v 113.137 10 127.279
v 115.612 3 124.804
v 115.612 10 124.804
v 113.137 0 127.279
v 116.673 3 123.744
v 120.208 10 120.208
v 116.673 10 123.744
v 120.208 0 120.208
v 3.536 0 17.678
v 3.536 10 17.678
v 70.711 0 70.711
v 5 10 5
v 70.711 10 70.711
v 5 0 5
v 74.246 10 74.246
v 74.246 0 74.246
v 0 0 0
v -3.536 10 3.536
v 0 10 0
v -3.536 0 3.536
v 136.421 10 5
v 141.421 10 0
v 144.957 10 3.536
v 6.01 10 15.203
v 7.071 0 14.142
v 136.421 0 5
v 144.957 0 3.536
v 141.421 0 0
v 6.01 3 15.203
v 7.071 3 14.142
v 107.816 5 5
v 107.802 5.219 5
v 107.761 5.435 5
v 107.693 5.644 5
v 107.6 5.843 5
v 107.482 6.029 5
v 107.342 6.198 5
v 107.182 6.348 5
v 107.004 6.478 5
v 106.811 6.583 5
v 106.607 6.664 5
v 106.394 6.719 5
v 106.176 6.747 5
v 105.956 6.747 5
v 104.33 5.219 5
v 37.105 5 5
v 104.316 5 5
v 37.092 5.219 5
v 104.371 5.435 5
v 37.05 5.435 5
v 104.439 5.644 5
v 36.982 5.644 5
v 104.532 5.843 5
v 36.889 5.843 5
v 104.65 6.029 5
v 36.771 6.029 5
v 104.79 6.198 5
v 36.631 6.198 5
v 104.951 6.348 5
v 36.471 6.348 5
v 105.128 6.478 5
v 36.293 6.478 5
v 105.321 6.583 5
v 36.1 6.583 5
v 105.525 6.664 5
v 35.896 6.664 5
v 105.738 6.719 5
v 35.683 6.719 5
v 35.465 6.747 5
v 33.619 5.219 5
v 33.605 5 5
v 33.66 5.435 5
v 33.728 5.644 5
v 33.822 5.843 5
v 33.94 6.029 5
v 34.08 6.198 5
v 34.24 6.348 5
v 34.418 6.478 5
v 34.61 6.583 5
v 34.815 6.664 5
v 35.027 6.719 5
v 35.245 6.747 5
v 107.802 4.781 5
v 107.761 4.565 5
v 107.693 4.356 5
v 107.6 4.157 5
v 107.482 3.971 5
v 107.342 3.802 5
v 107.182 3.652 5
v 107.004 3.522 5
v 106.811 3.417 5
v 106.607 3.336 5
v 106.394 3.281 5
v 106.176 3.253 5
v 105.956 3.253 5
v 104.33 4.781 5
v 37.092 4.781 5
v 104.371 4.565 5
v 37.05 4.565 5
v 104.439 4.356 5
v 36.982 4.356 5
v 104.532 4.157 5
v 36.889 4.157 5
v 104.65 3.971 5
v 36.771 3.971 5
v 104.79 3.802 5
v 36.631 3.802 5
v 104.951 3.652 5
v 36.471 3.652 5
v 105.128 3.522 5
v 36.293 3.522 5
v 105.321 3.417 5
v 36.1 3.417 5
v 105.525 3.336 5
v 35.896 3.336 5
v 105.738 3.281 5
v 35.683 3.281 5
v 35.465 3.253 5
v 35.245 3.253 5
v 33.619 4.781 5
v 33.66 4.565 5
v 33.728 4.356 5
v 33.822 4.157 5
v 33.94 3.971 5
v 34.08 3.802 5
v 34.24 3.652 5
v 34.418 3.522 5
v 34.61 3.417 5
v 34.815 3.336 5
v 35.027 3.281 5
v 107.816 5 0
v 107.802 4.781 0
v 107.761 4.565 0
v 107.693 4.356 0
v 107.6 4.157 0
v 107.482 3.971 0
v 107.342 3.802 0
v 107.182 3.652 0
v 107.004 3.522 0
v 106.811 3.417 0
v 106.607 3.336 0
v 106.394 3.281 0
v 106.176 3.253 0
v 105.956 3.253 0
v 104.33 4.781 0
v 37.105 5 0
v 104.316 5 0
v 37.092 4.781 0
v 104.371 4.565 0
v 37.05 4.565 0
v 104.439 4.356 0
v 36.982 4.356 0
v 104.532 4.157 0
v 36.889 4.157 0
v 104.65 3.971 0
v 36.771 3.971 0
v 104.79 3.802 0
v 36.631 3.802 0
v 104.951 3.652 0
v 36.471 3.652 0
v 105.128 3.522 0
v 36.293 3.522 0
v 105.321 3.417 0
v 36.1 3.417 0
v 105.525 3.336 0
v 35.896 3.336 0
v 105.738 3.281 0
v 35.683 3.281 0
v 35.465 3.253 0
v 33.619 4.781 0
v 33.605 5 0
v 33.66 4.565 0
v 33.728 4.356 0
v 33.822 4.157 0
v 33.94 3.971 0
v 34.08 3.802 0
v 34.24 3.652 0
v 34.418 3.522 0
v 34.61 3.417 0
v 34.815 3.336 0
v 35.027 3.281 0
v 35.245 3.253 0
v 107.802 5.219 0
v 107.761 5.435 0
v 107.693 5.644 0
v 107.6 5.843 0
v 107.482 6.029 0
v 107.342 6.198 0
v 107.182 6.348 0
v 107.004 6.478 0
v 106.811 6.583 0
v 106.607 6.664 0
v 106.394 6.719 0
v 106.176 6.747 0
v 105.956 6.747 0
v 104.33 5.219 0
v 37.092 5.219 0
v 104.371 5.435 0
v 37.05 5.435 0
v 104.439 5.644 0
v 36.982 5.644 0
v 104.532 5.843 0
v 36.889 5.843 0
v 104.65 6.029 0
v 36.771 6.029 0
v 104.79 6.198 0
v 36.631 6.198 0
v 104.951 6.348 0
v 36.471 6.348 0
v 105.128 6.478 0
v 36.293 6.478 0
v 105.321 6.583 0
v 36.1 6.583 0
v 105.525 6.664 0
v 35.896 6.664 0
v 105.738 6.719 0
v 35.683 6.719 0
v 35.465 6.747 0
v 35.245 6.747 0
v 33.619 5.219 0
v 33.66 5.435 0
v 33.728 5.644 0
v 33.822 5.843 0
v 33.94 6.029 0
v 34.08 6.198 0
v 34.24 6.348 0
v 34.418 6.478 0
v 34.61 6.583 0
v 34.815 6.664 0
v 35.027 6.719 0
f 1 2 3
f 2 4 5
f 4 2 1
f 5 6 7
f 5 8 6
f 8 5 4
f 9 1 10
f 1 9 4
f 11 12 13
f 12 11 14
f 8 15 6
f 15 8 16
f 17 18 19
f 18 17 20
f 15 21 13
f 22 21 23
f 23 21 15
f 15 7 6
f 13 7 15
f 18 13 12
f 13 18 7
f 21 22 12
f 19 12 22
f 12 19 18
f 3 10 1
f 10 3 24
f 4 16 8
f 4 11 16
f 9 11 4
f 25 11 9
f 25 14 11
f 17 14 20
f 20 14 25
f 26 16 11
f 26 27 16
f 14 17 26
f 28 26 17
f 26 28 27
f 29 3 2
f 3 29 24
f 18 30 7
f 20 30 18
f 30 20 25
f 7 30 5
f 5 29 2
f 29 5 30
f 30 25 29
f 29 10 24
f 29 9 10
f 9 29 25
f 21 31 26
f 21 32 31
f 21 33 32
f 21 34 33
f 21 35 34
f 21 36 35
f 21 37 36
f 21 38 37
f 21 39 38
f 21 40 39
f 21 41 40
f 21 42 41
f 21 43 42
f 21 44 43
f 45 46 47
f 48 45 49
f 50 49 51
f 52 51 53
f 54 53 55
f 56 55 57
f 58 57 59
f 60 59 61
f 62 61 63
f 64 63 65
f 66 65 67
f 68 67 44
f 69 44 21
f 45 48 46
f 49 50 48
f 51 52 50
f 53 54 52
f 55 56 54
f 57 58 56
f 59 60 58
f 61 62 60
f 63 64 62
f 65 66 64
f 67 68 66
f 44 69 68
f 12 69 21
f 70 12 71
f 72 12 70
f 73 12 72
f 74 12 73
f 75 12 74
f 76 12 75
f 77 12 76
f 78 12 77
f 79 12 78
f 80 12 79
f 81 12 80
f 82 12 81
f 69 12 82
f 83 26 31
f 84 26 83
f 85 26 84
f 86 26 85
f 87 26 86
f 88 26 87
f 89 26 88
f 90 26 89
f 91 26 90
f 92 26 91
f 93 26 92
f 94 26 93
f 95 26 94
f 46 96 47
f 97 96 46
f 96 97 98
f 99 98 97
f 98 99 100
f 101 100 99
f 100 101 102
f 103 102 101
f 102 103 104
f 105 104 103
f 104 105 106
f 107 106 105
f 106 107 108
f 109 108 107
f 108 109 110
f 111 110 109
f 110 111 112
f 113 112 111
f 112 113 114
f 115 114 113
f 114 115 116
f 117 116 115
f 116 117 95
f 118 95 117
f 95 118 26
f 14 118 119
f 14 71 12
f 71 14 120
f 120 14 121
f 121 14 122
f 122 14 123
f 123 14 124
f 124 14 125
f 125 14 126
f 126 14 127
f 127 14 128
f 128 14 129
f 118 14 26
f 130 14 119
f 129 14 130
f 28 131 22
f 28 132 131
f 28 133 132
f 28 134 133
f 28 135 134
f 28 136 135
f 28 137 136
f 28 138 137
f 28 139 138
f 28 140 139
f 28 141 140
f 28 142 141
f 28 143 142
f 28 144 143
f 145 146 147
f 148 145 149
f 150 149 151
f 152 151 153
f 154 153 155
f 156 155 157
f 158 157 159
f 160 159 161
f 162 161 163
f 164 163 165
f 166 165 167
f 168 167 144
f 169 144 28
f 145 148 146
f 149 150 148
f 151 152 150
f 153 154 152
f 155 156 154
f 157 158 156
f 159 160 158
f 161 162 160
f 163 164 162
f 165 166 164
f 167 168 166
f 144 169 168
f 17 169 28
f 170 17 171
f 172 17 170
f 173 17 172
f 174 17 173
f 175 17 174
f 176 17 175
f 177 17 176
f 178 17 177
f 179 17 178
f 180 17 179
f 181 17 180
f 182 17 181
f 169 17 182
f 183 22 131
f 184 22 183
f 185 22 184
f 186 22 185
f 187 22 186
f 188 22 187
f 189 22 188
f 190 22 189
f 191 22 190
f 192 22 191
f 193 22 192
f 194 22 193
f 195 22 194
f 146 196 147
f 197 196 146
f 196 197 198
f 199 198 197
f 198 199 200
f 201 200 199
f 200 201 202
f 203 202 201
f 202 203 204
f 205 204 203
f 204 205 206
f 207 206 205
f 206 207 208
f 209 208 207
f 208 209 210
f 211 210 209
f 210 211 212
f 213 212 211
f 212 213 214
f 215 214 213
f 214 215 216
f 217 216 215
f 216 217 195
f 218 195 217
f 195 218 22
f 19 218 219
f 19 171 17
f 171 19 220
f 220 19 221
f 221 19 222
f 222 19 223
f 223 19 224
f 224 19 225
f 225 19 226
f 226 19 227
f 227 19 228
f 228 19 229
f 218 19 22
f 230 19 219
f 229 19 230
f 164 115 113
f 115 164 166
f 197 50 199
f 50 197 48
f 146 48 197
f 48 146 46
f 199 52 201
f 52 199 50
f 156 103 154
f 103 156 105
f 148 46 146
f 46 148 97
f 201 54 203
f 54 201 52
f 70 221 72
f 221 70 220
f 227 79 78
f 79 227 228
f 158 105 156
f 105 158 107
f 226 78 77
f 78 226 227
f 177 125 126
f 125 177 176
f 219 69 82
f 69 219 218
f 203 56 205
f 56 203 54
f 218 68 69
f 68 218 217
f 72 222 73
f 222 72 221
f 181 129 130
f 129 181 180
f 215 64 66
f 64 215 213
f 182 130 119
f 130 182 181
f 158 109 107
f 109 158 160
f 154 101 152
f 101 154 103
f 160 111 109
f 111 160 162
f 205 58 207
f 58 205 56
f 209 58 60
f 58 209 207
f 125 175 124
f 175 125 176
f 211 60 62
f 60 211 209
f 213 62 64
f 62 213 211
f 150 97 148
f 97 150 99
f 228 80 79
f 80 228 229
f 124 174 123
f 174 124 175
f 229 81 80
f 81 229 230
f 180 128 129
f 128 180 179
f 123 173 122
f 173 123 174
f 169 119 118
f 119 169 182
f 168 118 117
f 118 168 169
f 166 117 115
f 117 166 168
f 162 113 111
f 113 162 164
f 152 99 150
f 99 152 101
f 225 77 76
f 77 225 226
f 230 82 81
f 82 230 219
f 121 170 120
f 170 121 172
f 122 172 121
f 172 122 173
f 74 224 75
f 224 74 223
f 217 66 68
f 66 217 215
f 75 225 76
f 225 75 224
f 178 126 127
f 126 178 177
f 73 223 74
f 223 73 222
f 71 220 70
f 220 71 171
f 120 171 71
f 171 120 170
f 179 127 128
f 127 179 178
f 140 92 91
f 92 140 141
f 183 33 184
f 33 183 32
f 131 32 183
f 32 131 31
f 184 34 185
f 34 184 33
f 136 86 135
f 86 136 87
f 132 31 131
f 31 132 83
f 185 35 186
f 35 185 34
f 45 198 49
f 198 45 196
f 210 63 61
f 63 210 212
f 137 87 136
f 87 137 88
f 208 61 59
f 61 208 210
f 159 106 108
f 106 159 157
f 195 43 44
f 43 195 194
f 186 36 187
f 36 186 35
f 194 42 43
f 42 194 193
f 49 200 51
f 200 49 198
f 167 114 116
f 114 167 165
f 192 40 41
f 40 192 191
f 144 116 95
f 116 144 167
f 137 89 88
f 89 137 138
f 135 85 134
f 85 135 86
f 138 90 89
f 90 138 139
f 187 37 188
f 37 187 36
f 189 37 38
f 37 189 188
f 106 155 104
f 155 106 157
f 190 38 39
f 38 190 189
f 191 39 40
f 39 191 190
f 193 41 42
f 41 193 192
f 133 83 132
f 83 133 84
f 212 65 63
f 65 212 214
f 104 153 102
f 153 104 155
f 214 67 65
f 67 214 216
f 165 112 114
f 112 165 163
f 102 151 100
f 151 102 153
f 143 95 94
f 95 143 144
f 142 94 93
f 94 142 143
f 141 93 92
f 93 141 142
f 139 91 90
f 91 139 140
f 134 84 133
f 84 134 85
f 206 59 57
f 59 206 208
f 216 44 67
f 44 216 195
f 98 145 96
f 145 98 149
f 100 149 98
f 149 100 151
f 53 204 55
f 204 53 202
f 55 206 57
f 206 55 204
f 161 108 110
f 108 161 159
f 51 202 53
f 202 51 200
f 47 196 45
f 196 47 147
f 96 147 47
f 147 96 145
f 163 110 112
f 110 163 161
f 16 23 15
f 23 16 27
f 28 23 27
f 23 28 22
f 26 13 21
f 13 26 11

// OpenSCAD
// Panel length (mm)
length = 155;

// Panel frame depth (mm)
frame = 15;

// Support bar position (mm)
barPos =100;

// Panel angle (max 55 degrees)
angle = 45;

// Channel witdh
channel = 1.5;

// Screw hole diameter (mm)
diameter = 3.5;

// Mirror model?
mirror = 0;

module solarBracket(){
    if(mirror == 0){
        Bracket();
    } else {
       translate([0,-50,0]){
            mirror([0,1,0])
                    Bracket();
        }
    }
}solarBracket();

module Bracket(){
    a =tan(angle)*barPos;                  // support lenght
    h = sqrt(pow(barPos,2)+pow(a,2));     // Base lenght
    difference(){
        rotate([0,-angle,0]){
            difference(){
                cube([length+frame,10,10]);       
                
                translate([0,3,5])
                    cube([length+frame,17,channel]);
                
                translate([0,0,5])
                    cube([frame,10,10]);
            }
           
            translate([barPos,0,-a])
                cube([5,10,a]);
            
            rotate([0,angle,0]){
                difference(){
                    cube([h,10,5]);
                    
                    spacing = h/4;
                    translate([spacing,5,0])
                         cylinder(h=10, d=diameter,$fn=50);
                    
                    translate([3*spacing,5,0])
                        cylinder(h=10, d=diameter,$fn=50);
                }
            }
        }
        translate([20,20,0])
            cube([20,20,20]);
    }
}
